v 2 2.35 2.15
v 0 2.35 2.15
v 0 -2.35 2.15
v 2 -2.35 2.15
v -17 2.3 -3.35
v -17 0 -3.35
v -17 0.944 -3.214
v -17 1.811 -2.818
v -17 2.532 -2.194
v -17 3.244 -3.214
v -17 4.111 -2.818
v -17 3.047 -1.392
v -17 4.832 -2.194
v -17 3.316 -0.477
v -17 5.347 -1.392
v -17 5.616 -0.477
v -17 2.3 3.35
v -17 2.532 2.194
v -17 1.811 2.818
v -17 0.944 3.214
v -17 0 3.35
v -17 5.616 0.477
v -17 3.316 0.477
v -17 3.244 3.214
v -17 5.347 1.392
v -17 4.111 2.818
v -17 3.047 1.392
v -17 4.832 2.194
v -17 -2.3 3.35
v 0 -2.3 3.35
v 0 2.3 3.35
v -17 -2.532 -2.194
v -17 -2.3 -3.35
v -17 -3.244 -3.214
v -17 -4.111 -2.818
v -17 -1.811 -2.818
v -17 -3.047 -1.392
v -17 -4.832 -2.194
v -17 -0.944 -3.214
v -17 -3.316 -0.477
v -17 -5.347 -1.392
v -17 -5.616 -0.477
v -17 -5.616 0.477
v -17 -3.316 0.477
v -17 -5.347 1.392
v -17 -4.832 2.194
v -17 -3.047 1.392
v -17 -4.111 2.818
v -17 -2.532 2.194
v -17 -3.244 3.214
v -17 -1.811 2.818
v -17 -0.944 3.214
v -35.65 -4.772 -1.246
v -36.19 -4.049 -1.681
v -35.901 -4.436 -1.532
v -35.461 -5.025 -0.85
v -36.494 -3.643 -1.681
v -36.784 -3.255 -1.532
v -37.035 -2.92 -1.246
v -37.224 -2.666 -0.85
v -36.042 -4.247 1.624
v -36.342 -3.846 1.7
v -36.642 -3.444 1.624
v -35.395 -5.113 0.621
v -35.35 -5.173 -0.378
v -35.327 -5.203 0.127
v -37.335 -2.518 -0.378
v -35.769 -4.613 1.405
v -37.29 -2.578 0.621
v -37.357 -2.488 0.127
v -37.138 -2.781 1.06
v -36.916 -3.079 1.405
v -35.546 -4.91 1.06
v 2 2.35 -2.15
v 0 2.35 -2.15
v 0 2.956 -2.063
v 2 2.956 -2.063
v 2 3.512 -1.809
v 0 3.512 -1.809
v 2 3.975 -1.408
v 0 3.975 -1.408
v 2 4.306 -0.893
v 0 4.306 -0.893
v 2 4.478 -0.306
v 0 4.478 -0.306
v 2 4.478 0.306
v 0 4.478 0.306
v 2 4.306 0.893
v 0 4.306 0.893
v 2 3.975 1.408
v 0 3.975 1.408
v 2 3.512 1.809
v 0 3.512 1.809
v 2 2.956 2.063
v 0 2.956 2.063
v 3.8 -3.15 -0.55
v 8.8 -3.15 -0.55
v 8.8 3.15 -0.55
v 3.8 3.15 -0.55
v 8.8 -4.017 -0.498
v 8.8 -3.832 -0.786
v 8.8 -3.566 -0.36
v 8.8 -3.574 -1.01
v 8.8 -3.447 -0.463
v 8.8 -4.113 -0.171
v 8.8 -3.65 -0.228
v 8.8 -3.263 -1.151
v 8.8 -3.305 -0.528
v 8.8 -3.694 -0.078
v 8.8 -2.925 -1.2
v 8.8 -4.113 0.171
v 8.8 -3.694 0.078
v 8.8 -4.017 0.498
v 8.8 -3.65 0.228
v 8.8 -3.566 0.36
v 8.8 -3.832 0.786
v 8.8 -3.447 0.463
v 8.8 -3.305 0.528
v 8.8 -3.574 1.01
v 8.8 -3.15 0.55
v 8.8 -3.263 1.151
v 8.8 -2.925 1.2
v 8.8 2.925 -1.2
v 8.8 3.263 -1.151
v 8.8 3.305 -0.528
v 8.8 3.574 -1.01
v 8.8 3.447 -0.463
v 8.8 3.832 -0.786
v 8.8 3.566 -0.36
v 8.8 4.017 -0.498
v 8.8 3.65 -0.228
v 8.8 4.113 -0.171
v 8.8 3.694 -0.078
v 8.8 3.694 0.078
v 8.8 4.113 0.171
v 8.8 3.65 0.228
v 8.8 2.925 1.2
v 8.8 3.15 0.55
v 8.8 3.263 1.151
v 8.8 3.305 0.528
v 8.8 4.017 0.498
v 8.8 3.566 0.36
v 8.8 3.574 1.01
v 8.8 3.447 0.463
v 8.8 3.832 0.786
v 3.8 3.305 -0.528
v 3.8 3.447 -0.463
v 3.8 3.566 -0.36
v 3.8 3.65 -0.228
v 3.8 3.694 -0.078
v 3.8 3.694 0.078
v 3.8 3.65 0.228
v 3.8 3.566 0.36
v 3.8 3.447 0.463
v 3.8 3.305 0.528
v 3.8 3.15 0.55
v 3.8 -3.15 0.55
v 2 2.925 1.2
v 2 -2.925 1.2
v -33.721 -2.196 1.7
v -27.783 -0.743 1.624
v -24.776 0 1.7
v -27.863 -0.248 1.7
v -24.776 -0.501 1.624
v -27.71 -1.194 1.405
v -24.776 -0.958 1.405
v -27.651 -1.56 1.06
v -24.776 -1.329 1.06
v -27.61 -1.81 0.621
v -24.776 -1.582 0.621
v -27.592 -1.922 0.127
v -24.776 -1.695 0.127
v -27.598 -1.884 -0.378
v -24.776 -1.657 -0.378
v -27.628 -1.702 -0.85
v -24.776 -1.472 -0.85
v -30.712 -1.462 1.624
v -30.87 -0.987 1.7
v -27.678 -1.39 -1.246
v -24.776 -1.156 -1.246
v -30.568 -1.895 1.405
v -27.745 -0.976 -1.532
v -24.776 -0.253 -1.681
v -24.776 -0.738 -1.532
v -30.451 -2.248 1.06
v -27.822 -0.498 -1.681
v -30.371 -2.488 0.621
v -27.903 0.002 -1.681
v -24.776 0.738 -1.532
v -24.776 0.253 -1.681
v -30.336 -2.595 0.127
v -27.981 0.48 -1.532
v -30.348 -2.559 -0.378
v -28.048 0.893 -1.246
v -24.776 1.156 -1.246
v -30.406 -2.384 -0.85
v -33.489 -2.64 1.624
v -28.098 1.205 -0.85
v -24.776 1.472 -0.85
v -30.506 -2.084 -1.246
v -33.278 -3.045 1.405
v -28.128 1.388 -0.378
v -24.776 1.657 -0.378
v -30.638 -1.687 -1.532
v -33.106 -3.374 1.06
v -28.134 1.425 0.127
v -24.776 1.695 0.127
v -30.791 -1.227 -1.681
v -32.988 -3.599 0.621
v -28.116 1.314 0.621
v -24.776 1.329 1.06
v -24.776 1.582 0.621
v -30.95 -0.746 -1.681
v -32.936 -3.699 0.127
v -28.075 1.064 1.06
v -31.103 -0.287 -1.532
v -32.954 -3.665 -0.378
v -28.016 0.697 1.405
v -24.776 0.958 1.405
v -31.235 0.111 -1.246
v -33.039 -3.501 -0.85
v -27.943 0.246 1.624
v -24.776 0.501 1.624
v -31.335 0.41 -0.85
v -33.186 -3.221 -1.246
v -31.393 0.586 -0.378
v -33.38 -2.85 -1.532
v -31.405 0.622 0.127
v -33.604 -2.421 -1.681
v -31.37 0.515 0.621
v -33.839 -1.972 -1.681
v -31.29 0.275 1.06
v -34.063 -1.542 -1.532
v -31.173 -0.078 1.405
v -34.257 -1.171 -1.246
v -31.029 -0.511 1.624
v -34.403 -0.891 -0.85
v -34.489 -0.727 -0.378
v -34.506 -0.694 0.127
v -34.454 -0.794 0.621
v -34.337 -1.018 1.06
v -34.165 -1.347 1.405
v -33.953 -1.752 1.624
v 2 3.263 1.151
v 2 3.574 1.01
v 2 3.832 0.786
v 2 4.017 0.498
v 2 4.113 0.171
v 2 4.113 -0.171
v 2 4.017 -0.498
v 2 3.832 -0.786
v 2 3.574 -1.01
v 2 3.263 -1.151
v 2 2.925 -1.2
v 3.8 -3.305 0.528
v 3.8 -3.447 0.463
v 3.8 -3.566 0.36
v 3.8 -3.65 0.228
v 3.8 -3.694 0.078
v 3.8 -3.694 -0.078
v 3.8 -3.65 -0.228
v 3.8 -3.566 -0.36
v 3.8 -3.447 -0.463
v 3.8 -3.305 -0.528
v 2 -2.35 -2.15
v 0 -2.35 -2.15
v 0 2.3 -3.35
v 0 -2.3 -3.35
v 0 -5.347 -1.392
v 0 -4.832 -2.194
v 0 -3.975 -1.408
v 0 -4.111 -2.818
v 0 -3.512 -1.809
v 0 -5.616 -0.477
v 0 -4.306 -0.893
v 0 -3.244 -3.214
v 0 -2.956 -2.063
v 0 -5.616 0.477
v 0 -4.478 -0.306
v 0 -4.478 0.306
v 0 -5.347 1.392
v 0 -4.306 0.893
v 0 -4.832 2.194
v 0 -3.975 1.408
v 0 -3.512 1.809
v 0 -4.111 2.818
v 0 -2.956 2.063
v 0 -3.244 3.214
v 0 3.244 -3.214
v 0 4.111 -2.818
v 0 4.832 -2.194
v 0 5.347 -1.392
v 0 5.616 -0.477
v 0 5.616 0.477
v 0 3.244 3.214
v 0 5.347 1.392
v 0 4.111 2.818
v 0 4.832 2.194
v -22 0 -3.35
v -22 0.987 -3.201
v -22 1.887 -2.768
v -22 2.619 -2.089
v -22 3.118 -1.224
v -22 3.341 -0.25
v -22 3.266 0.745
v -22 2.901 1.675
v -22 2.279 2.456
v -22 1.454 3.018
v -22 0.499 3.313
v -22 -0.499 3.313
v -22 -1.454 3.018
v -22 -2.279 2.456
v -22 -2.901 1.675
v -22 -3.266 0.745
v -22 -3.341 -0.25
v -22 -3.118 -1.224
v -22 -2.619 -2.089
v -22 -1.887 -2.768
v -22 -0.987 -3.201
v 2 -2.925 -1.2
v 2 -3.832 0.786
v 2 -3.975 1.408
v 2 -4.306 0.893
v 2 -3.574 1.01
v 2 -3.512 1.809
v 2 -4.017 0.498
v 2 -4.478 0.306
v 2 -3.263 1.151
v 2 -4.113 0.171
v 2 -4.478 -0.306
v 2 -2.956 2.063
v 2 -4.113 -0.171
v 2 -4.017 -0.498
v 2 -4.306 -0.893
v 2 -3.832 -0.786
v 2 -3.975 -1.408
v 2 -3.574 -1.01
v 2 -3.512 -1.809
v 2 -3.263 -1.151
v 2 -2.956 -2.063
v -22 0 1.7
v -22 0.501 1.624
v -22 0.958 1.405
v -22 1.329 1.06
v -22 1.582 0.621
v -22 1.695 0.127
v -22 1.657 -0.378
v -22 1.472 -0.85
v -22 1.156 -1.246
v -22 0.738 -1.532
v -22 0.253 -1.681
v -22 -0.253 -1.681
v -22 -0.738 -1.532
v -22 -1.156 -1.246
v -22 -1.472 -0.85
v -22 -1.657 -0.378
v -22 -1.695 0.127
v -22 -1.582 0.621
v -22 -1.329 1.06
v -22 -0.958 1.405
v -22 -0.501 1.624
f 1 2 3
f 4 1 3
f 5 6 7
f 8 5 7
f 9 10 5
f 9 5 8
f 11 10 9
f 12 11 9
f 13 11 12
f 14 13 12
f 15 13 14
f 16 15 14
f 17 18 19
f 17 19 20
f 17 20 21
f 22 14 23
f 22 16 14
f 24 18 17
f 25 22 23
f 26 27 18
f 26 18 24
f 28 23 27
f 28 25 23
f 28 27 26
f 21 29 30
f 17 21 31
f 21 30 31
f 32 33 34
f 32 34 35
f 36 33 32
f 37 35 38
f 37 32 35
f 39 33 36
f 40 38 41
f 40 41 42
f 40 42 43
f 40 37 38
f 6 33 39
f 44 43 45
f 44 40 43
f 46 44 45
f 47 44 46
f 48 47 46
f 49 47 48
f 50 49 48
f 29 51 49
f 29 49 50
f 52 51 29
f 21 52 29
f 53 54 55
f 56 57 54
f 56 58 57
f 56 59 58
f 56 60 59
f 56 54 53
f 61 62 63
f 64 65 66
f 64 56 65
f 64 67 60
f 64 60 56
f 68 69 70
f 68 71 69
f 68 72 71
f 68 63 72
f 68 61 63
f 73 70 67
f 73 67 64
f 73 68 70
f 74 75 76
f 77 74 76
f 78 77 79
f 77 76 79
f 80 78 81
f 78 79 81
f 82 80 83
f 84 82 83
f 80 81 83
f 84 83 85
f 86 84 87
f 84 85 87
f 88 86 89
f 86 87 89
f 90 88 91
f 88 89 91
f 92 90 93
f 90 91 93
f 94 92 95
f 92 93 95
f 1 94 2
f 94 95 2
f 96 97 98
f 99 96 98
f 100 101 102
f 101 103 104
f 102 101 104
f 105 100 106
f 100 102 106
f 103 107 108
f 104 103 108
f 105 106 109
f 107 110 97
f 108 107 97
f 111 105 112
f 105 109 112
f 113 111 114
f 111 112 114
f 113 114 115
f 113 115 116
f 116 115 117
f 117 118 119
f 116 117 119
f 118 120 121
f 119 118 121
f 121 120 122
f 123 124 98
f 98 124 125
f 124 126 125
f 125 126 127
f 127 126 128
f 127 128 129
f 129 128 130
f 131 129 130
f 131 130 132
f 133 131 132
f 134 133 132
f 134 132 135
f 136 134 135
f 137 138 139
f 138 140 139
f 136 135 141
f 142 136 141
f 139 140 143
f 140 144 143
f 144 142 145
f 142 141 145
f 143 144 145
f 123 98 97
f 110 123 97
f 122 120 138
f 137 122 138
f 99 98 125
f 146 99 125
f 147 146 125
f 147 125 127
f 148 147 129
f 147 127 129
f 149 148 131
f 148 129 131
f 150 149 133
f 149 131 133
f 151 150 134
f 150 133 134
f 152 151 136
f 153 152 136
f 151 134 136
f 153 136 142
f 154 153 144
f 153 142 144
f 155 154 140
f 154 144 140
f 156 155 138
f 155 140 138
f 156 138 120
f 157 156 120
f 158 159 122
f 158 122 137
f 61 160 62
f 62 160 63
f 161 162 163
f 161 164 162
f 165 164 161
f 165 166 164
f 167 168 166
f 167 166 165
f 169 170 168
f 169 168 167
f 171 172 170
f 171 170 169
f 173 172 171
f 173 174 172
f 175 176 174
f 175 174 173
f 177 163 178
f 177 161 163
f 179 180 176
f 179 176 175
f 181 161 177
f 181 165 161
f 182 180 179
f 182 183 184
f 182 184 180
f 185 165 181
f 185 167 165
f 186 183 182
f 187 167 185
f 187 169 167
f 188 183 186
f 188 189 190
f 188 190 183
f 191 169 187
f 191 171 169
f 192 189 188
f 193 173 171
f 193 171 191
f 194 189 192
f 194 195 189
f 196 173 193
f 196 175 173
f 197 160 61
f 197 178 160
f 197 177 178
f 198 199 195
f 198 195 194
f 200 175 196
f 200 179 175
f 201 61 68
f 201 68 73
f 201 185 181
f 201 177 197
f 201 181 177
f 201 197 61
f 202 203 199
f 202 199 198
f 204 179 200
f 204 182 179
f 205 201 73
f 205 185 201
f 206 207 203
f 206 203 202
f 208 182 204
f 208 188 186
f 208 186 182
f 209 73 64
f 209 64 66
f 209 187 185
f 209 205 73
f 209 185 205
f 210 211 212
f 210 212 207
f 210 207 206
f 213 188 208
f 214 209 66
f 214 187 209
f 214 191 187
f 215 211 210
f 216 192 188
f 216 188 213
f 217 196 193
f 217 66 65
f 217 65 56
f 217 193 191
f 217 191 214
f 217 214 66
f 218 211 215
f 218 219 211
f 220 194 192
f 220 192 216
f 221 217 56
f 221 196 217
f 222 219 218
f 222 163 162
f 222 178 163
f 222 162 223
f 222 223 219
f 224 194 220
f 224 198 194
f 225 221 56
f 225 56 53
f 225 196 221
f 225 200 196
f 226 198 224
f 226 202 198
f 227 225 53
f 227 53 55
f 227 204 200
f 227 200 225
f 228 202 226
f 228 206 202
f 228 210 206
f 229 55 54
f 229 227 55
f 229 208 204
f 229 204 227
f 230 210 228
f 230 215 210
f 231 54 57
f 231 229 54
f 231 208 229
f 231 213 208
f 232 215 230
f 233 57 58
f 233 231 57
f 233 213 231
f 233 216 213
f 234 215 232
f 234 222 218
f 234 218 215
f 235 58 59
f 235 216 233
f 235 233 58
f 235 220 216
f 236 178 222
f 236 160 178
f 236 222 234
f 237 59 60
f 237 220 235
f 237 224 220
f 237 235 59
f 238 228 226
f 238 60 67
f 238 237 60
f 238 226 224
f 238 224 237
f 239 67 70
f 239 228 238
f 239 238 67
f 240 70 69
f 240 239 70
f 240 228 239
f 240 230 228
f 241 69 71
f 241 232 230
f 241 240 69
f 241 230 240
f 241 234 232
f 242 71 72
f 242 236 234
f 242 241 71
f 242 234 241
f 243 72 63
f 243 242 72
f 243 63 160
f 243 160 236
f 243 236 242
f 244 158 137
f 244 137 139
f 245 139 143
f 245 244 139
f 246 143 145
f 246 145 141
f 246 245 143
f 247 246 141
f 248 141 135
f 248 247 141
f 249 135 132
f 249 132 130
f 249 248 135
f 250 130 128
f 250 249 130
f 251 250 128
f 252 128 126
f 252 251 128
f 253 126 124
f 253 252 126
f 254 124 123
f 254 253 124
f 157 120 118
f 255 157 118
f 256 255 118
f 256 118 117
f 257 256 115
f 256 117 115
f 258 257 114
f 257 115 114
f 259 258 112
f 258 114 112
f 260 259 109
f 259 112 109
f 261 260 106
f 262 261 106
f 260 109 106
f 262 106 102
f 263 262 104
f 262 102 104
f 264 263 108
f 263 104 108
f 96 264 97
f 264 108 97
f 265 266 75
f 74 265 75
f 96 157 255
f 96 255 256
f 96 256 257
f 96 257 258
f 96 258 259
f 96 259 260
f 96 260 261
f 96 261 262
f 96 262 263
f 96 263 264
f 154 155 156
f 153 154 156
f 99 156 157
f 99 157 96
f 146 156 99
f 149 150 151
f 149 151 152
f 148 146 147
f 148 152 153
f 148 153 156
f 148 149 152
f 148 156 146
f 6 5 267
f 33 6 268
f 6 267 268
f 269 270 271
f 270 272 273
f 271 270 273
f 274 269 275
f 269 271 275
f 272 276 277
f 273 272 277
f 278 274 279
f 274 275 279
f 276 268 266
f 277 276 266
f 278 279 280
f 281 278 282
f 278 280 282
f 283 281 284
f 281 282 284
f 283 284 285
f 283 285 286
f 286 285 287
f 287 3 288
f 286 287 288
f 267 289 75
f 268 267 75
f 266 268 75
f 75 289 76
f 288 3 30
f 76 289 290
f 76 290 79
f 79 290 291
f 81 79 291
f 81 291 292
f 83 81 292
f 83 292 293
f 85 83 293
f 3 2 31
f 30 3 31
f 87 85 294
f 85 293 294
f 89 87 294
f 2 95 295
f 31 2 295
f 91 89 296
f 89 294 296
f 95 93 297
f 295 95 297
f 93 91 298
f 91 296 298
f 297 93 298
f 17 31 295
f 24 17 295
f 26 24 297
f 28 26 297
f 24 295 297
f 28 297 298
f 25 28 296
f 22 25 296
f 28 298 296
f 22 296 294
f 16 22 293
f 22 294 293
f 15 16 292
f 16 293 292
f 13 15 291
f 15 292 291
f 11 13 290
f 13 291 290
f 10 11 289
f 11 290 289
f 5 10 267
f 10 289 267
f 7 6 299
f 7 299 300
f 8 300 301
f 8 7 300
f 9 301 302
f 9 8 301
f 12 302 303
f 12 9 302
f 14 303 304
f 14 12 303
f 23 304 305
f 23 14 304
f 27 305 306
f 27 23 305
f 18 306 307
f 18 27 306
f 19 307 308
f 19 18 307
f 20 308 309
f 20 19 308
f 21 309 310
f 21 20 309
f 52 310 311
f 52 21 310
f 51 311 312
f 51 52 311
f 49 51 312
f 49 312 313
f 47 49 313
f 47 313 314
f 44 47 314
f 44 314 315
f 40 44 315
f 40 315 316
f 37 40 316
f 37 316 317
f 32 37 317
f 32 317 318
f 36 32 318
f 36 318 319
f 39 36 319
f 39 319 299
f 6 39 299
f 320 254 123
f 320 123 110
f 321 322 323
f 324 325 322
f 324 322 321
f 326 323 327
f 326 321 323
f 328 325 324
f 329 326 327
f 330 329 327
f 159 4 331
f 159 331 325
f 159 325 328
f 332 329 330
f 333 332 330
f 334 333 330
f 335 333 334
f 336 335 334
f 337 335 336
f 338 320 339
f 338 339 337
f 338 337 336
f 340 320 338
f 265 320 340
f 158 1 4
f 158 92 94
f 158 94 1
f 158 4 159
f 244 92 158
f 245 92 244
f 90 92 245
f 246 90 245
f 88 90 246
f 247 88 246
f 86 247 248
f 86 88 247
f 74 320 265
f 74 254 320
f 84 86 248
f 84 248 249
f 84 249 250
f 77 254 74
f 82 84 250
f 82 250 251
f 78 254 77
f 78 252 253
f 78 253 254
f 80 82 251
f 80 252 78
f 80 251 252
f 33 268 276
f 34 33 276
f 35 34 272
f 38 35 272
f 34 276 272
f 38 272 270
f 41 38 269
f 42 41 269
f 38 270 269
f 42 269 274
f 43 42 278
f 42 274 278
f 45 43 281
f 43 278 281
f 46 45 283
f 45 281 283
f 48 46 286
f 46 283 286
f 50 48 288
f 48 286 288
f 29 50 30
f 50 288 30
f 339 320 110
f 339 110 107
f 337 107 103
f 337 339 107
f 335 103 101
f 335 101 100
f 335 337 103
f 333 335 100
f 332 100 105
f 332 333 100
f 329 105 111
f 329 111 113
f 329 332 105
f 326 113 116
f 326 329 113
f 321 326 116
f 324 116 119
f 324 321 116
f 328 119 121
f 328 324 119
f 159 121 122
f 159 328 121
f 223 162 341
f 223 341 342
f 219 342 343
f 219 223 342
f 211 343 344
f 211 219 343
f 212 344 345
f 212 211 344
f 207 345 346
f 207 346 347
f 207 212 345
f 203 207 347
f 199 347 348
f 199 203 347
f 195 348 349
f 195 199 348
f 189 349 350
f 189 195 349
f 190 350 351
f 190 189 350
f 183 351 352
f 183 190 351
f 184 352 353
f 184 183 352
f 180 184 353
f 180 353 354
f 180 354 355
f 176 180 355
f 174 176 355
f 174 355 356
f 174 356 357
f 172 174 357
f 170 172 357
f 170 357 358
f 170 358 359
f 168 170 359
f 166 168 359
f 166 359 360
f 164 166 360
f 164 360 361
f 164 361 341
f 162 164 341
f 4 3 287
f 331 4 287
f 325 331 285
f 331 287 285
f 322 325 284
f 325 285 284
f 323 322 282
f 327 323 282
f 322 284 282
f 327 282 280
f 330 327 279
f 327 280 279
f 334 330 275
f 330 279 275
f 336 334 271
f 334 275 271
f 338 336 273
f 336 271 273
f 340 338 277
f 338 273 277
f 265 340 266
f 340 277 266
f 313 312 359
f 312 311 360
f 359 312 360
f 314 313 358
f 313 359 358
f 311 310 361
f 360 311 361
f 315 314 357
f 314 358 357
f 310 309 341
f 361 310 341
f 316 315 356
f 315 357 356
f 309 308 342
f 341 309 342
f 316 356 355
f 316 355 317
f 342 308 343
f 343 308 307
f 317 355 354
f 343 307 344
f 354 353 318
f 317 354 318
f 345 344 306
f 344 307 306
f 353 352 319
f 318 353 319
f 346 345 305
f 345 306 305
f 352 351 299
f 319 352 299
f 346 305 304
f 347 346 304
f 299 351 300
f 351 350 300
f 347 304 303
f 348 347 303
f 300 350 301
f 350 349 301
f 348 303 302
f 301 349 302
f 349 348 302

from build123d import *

# Parameters (mm, degrees)
EXTRUDE_1_DEPTH     = 17
EXTRUDE_2_DEPTH     = 2
SKETCH_4_R          = 3.35
EXTRUDE_3_DEPTH     = 5
SKETCH_5_R          = 1.7
EXTRUDE_4_DEPTH     = 6.8
CUT_EXTRUDE_1_DEPTH = 5


with BuildPart() as part:
    # Эскиз1 → Бобышка-Вытянуть1 (new body)
    with BuildSketch(Plane(origin=(0, 0, 0), x_dir=(0, 0, -1), z_dir=(1, 0, 0))):
        with BuildLine():
            Line((-3.35, -2.3), (-3.35, 2.3))
            ThreePointArc((-3.35, 2.3), (0, 5.65), (3.35, 2.3))
            Line((3.35, 2.3), (3.35, -2.3))
            ThreePointArc((3.35, -2.3), (0, -5.65), (-3.35, -2.3))
        make_face()
    extrude(amount=-EXTRUDE_1_DEPTH)

    # Эскиз3 → Бобышка-Вытянуть2 (add)
    with BuildSketch(Plane.ZY):
        with BuildLine():
            Line((2.15, 2.35), (2.15, -2.35))
            ThreePointArc((2.15, -2.35), (0, -4.5), (-2.15, -2.35))
            Line((-2.15, -2.35), (-2.15, 2.35))
            ThreePointArc((-2.15, 2.35), (0, 4.5), (2.15, 2.35))
        make_face()
    extrude(amount=-EXTRUDE_2_DEPTH)

    # Эскиз4 → Бобышка-Вытянуть3 (add)
    with BuildSketch(Plane(origin=(-17, 0, 0), x_dir=(0, 0, -1), z_dir=(1, 0, 0))):
        Circle(SKETCH_4_R)
    extrude(amount=-EXTRUDE_3_DEPTH)

    # По траектории1: sweep along a path in Эскиз6
    with BuildLine(Plane.XY) as sweep_1_path:
        Line((-22, 0), (-24.776161806, 0))
        ThreePointArc((-24.776161806, 0), (-30.870449905, -0.986593903), (-36.342181829, -3.845591055))
    # Эскиз5 → По траектории1 (sweep)
    with BuildSketch(Plane.ZY.offset(22)):
        Circle(SKETCH_5_R)
    sweep(path=sweep_1_path.line)

    # Эскиз7 → Бобышка-Вытянуть4 (add)
    with BuildSketch(Plane(origin=(2, 0, 0), x_dir=(0, 0, -1), z_dir=(1, 0, 0))):
        with BuildLine():
            Line((-1.2, -2.925), (-1.2, 2.925))
            ThreePointArc((-1.2, 2.925), (0, 4.125), (1.2, 2.925))
            Line((1.2, 2.925), (1.2, -2.925))
            ThreePointArc((1.2, -2.925), (0, -4.125), (-1.2, -2.925))
        make_face()
    extrude(amount=EXTRUDE_4_DEPTH)

    # Эскиз8 → Вырез-Вытянуть1 (cut)
    with BuildSketch(Plane(origin=(8.8, 0, -8.8), x_dir=(0, 0, 1), z_dir=(-1, 0, 0))):
        with BuildLine():
            Line((8.25, -3.15), (8.25, 3.15))
            ThreePointArc((8.25, 3.15), (8.8, 3.7), (9.35, 3.15))
            Line((9.35, 3.15), (9.35, -3.15))
            ThreePointArc((9.35, -3.15), (8.8, -3.7), (8.25, -3.15))
        make_face()
    extrude(amount=CUT_EXTRUDE_1_DEPTH, mode=Mode.SUBTRACT)


solid = part.part
